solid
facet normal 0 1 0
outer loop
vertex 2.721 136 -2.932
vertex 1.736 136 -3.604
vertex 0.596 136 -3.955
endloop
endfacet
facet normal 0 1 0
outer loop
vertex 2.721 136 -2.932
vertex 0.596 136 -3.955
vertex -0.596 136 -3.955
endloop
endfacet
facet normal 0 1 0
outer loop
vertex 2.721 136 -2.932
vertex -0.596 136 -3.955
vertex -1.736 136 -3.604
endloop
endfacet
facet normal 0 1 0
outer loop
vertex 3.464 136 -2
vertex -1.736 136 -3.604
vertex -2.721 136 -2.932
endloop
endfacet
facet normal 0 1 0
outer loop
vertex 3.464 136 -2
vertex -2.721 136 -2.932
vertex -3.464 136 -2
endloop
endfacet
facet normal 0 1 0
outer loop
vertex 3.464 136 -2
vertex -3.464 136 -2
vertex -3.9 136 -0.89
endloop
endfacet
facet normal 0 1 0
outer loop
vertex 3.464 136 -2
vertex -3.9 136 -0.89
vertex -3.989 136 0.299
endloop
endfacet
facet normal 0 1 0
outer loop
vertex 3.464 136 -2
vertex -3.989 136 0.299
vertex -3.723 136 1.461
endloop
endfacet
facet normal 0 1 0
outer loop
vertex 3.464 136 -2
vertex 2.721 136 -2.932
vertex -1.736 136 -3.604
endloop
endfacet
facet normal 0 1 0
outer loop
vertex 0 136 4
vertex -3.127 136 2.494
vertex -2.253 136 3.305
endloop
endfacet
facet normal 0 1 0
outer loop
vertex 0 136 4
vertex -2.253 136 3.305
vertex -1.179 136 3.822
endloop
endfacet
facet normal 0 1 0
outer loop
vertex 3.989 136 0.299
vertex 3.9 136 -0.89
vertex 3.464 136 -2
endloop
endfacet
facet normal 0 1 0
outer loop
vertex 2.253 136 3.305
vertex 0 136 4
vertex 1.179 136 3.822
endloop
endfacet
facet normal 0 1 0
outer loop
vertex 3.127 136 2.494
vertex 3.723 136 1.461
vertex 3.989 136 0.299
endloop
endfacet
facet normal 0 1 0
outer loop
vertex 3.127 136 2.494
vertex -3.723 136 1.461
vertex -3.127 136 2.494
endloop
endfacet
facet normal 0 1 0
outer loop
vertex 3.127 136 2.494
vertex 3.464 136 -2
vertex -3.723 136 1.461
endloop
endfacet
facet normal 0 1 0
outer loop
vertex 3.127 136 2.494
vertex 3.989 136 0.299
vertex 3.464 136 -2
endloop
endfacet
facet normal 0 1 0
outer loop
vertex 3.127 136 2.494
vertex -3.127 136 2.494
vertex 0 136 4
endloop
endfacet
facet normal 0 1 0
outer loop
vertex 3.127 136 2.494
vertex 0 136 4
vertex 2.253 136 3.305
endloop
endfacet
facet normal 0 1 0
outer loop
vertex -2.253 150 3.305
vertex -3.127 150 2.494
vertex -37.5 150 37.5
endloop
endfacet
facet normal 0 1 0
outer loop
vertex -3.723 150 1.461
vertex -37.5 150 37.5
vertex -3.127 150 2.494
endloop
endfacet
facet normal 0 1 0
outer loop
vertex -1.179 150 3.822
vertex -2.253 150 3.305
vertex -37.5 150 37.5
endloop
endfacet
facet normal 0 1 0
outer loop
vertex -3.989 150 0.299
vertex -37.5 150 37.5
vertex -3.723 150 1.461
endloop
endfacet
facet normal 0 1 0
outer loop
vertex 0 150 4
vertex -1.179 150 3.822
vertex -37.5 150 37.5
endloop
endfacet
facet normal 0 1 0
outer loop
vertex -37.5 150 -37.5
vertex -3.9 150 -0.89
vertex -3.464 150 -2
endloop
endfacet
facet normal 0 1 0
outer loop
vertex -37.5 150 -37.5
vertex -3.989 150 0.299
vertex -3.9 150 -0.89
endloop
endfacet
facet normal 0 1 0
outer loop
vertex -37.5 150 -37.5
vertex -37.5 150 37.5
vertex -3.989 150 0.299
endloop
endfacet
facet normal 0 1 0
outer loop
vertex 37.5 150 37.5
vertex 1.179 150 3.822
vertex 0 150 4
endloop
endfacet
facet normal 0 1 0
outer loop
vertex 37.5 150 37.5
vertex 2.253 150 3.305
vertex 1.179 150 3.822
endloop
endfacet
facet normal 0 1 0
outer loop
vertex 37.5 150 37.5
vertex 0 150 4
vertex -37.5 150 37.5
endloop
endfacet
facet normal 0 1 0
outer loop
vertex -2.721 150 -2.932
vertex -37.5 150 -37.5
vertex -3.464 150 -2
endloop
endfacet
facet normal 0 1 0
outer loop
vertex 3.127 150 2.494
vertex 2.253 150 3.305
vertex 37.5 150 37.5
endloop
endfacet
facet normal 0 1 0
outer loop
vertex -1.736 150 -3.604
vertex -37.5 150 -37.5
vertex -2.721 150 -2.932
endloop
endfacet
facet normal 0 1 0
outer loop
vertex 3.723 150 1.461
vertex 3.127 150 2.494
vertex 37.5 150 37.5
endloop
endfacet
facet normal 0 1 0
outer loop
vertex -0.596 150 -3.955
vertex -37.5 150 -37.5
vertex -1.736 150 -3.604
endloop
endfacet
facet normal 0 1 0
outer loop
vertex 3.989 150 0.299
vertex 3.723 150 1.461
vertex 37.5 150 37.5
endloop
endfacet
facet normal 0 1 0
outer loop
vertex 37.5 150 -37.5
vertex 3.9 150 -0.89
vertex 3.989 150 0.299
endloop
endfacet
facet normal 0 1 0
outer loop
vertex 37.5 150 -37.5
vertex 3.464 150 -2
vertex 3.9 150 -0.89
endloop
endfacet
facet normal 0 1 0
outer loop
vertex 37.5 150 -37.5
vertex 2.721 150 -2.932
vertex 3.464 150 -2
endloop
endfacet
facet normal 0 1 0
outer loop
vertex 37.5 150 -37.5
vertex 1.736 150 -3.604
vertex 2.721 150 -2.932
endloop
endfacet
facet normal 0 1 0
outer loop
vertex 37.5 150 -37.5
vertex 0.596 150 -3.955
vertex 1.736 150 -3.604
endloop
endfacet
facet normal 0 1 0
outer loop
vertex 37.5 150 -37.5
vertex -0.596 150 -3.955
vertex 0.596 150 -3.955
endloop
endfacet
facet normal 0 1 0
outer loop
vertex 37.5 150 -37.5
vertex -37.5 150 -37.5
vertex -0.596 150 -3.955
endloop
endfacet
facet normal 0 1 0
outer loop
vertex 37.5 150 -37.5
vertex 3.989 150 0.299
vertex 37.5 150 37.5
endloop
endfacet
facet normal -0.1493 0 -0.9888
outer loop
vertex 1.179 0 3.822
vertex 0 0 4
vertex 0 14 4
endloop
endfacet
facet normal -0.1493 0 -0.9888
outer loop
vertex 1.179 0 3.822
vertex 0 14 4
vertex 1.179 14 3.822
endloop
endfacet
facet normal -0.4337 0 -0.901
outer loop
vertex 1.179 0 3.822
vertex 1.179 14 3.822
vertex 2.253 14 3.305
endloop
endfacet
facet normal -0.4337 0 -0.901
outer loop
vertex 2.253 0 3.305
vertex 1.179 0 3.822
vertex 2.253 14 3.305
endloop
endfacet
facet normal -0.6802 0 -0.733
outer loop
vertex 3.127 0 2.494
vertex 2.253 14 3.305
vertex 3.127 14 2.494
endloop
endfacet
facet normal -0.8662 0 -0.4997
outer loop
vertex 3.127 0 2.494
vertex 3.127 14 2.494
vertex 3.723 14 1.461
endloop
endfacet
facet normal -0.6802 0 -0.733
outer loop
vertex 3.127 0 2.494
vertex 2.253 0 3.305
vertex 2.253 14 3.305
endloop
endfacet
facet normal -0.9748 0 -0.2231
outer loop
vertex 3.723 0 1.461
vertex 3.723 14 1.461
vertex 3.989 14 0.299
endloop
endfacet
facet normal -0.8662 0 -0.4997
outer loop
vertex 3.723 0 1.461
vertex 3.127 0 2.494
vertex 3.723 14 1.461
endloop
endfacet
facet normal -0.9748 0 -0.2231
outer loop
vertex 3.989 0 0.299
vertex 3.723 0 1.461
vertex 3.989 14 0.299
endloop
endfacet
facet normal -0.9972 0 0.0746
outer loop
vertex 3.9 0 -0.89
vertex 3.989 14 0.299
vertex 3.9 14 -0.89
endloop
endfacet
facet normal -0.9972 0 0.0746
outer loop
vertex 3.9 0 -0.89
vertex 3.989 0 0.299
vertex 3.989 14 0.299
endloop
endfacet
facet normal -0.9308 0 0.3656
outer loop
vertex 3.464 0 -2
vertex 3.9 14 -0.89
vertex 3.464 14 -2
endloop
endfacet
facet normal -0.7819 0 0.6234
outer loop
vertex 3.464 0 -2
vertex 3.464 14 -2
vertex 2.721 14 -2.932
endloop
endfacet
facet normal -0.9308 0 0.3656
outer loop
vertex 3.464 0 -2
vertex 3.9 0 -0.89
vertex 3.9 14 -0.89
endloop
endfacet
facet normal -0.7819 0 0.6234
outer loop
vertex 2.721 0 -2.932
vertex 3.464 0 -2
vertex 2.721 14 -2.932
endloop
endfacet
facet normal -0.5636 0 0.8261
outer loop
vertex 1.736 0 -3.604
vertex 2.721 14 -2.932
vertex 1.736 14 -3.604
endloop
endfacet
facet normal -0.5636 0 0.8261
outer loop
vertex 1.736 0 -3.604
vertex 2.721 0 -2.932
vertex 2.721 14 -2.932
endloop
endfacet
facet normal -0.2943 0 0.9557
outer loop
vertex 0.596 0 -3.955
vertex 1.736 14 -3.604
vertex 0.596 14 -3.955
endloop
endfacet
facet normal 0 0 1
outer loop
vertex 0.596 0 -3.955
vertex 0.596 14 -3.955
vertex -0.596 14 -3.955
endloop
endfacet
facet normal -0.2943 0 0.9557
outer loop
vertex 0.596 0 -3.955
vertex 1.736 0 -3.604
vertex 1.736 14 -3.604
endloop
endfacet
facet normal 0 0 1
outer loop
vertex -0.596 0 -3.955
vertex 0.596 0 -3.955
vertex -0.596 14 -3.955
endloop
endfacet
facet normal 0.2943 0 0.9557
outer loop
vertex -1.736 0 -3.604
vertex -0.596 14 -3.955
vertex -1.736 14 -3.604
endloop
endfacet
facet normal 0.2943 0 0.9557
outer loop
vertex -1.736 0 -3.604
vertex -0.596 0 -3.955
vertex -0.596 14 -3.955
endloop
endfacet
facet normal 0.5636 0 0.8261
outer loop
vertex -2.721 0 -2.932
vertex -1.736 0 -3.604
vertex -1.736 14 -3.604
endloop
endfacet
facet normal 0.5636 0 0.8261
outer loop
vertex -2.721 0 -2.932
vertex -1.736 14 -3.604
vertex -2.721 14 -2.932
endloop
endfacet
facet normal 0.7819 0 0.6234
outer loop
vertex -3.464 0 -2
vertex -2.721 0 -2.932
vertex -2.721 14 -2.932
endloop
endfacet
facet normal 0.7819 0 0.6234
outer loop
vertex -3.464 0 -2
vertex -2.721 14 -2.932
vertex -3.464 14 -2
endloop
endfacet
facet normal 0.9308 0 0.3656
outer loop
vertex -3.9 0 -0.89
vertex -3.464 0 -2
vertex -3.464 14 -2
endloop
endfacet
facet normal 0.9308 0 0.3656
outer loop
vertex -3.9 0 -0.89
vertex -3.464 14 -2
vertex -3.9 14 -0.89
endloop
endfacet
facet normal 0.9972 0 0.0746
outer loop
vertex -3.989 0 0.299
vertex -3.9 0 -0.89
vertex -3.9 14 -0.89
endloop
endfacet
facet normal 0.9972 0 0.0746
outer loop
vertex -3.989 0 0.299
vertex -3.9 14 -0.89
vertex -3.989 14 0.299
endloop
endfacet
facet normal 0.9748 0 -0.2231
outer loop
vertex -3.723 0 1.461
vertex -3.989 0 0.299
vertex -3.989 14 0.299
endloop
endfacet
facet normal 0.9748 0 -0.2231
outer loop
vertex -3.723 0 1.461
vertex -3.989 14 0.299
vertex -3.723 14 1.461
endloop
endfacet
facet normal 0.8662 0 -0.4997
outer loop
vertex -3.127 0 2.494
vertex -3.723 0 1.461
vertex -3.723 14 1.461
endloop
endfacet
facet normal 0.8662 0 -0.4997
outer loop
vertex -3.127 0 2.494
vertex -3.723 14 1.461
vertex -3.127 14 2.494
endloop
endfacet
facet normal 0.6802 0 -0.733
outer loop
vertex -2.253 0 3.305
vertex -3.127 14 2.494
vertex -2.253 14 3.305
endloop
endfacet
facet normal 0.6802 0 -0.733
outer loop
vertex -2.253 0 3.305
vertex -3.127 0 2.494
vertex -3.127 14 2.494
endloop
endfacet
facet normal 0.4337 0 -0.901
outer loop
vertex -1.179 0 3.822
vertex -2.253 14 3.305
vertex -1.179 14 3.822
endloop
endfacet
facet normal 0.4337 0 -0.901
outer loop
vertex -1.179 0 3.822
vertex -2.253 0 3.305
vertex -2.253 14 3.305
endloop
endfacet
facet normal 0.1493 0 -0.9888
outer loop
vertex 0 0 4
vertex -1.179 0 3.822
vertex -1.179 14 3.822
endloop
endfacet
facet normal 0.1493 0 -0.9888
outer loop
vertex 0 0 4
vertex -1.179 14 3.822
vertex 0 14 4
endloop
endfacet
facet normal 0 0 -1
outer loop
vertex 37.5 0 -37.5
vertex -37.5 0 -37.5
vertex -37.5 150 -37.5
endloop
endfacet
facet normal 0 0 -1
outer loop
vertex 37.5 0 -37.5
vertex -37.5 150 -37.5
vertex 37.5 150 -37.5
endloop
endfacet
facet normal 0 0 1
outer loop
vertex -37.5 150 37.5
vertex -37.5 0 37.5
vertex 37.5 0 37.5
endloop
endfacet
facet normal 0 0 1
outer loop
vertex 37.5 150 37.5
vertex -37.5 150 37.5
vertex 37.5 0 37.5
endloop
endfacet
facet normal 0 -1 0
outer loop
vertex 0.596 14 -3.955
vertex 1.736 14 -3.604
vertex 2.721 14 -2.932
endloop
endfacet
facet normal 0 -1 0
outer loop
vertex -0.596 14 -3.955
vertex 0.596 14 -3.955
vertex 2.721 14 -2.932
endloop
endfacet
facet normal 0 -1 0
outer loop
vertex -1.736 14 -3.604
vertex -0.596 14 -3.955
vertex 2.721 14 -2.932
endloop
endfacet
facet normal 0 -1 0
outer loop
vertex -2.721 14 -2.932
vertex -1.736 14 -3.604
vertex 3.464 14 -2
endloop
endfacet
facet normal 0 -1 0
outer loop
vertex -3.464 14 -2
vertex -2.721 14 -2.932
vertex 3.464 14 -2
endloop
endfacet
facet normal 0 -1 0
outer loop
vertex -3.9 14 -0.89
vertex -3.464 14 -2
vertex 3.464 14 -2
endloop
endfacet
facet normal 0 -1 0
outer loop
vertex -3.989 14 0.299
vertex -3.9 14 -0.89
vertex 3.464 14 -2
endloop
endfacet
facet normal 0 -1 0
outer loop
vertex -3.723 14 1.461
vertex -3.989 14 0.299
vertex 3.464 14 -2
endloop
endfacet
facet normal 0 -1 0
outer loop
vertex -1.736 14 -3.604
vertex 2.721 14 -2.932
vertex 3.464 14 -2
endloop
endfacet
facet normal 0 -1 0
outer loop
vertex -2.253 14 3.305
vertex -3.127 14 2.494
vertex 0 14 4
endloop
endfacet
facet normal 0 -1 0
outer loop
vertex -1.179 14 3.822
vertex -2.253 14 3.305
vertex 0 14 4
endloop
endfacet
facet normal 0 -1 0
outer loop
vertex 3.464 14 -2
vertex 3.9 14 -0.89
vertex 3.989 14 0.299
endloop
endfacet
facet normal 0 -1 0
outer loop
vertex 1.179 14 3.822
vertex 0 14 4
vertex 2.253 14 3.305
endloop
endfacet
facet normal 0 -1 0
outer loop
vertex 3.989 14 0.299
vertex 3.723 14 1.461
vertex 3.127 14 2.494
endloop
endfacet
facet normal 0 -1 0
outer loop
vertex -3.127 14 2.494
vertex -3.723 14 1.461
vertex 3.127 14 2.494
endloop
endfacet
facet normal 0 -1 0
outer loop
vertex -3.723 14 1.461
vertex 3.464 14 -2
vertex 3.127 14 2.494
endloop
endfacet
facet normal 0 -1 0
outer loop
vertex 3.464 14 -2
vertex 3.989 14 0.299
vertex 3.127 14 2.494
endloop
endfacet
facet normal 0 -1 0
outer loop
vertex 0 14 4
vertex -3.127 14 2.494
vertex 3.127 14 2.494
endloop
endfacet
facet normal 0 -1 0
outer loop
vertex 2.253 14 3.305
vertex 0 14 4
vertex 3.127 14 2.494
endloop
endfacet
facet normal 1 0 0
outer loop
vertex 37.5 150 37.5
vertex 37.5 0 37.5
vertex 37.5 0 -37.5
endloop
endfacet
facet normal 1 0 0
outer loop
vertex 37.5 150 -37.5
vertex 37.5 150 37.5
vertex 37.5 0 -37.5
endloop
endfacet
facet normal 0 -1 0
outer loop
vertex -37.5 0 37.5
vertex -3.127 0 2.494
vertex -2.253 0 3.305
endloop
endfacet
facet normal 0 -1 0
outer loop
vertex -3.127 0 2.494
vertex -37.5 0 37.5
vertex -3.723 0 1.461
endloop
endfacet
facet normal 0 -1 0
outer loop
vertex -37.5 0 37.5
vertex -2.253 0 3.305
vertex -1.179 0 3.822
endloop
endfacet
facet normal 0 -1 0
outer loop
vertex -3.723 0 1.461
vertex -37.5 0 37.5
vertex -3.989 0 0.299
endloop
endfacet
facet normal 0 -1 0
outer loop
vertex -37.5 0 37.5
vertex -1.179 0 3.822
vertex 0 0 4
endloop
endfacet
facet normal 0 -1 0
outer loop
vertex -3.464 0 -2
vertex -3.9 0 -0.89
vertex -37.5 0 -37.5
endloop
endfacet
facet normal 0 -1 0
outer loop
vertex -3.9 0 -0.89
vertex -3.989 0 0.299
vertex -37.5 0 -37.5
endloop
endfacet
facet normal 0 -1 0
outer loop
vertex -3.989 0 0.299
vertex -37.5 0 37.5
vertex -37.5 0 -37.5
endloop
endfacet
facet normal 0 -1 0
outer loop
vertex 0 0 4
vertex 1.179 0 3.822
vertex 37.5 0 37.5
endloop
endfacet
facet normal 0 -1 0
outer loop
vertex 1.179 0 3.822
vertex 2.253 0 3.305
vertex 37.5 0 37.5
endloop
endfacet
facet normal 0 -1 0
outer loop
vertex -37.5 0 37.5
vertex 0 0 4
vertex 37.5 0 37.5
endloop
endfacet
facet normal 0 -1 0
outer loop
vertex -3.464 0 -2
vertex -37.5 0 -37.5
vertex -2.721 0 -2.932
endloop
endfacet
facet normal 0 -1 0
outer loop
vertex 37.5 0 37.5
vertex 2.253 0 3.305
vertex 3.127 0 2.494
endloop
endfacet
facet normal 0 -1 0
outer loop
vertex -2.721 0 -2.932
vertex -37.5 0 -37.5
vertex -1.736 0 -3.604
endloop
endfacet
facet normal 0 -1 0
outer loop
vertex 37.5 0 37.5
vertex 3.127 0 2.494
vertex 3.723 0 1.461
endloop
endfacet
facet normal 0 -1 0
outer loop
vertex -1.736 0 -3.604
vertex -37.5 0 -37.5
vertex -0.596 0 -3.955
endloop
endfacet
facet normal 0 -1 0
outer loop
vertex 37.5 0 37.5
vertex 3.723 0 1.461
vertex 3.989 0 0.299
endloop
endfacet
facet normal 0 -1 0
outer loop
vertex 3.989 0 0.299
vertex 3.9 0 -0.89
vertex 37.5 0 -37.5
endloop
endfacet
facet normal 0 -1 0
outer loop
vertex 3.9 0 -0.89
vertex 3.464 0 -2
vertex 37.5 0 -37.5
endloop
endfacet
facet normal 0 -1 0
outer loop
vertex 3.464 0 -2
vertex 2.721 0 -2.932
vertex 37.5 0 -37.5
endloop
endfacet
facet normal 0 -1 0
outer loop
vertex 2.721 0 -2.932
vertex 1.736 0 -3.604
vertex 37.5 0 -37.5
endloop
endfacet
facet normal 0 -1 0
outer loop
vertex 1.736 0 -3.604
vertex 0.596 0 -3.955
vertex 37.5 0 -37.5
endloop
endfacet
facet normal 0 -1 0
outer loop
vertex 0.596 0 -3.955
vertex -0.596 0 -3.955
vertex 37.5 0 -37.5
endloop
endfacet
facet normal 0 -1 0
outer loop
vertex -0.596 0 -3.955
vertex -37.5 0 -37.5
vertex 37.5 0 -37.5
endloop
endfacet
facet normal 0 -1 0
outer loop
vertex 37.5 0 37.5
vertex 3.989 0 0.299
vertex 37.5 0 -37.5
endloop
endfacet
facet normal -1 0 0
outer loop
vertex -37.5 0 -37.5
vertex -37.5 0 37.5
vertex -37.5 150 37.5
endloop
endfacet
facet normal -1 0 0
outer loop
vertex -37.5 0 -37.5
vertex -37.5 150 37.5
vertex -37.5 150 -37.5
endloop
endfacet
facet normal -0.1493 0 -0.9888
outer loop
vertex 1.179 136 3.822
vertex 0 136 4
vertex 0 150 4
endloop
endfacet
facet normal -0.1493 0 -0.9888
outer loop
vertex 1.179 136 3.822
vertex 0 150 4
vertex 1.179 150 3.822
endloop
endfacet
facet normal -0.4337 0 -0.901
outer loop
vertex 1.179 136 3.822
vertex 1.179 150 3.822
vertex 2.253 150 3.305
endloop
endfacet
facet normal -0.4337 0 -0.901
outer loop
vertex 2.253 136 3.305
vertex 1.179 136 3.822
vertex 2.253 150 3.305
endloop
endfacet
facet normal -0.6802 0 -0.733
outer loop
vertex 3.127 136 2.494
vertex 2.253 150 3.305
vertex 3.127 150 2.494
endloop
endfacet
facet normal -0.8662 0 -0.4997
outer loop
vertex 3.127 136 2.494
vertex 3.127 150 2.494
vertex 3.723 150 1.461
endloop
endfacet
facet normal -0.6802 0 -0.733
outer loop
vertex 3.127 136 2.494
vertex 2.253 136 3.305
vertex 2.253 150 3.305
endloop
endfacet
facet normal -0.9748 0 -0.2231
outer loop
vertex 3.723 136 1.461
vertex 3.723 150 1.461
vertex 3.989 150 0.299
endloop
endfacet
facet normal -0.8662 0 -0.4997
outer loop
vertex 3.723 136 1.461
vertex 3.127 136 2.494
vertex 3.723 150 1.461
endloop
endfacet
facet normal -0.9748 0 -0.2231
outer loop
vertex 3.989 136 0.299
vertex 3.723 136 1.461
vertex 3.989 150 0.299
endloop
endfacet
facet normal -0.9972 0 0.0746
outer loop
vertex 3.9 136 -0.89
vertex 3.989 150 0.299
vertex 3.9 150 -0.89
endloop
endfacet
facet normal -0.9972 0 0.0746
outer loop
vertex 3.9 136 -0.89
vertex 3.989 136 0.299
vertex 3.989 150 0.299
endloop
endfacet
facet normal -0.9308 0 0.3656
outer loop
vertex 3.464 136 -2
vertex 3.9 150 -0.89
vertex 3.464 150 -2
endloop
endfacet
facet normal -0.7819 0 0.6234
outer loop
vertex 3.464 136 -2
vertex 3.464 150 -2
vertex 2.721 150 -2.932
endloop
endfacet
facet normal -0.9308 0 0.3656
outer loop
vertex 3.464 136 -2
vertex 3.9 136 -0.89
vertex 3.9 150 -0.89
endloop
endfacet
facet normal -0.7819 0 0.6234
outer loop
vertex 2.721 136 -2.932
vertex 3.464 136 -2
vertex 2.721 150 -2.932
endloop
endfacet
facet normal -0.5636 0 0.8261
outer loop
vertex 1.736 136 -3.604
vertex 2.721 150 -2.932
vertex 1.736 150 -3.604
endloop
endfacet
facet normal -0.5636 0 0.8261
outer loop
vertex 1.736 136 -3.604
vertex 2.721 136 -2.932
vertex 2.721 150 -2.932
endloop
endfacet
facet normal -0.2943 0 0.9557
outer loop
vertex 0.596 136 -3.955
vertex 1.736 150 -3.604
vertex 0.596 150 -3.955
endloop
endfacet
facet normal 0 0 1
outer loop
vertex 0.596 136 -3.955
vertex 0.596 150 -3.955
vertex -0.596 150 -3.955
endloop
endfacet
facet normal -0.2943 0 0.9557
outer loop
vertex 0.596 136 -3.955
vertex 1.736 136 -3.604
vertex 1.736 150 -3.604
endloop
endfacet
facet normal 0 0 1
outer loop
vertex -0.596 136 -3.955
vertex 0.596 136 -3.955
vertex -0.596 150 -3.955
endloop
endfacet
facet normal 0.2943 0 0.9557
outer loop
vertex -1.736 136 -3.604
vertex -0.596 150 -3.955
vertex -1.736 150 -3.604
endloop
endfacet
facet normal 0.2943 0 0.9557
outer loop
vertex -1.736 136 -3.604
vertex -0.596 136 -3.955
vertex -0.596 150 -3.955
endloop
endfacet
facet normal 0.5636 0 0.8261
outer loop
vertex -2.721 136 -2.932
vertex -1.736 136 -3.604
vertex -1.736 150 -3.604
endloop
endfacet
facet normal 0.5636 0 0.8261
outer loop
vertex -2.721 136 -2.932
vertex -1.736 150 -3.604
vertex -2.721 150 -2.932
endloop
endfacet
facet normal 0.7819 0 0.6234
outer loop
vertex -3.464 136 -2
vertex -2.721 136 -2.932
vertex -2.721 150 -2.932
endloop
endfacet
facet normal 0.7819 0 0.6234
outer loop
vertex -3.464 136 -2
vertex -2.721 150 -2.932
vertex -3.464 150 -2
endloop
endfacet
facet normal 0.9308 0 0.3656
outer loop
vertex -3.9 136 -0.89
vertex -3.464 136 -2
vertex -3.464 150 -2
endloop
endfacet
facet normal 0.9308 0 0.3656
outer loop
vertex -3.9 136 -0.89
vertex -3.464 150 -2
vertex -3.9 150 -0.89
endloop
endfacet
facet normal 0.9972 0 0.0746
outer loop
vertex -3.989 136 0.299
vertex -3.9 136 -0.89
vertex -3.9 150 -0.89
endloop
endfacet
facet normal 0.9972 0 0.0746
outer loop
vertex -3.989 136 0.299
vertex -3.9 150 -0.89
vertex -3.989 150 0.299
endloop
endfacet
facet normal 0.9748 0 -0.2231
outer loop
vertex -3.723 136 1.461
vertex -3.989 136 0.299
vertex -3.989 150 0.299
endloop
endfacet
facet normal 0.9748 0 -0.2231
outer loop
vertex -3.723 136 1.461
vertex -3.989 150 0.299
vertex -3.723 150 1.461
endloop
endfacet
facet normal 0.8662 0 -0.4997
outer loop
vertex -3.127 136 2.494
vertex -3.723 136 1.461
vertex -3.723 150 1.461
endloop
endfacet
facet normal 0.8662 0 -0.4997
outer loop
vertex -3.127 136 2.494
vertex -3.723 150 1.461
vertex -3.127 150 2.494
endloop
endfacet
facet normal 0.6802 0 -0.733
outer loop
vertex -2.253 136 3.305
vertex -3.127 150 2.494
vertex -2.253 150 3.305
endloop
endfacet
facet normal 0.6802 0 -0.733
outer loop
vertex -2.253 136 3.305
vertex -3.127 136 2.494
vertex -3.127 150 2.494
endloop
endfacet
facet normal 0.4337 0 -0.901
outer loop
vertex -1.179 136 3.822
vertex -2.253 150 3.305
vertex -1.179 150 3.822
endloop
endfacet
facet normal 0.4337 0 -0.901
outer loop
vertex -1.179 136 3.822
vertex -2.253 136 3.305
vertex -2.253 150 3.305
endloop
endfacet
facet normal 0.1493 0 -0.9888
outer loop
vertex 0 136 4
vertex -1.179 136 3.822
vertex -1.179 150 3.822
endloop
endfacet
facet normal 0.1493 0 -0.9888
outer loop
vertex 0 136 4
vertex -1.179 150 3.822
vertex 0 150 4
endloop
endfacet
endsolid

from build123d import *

# Parameters (mm, degrees)
CROQUIS_BASE_W             = 75
CROQUIS_BASE_H             = 75
COLUMNA_75X150_DEPTH       = 150
CROQUIS_AGUJEROS_MONTAJE_R = 4
AGUJERO_INSERTO_M6_DEPTH   = 14
AGUJERO_SUPERIOR_M6_START  = -14
CROQUIS_AGUJERO_SUPERIOR_R = 4
AGUJERO_SUPERIOR_M6_DEPTH  = 14


with BuildPart() as part:
    # Croquis_base → Columna_75x150 (new body)
    with BuildSketch(Plane(origin=(0, 0, 0), x_dir=(1, 0, 0), z_dir=(0, 1, 0))):
        Rectangle(CROQUIS_BASE_W, CROQUIS_BASE_H)
    extrude(amount=COLUMNA_75X150_DEPTH)

    # Croquis_agujeros_montaje → Agujero_inserto_M6 (cut)
    with BuildSketch(Plane(origin=(0, 0, 0), x_dir=(1, 0, 0), z_dir=(0, 1, 0))):
        with Locations(Location((0, 0, 0), (0, 0, 270))):
            Circle(CROQUIS_AGUJEROS_MONTAJE_R)
    extrude(amount=AGUJERO_INSERTO_M6_DEPTH, mode=Mode.SUBTRACT)

    # Croquis_agujero_superior → Agujero_superior_M6 (cut)
    with BuildSketch(Plane(origin=(0, 150, 0), x_dir=(1, 0, 0), z_dir=(0, 1, 0)).offset(AGUJERO_SUPERIOR_M6_START)):
        with Locations(Location((0, 0, 0), (0, 0, 270))):
            Circle(CROQUIS_AGUJERO_SUPERIOR_R)
    extrude(amount=AGUJERO_SUPERIOR_M6_DEPTH, mode=Mode.SUBTRACT)


solid = part.part
